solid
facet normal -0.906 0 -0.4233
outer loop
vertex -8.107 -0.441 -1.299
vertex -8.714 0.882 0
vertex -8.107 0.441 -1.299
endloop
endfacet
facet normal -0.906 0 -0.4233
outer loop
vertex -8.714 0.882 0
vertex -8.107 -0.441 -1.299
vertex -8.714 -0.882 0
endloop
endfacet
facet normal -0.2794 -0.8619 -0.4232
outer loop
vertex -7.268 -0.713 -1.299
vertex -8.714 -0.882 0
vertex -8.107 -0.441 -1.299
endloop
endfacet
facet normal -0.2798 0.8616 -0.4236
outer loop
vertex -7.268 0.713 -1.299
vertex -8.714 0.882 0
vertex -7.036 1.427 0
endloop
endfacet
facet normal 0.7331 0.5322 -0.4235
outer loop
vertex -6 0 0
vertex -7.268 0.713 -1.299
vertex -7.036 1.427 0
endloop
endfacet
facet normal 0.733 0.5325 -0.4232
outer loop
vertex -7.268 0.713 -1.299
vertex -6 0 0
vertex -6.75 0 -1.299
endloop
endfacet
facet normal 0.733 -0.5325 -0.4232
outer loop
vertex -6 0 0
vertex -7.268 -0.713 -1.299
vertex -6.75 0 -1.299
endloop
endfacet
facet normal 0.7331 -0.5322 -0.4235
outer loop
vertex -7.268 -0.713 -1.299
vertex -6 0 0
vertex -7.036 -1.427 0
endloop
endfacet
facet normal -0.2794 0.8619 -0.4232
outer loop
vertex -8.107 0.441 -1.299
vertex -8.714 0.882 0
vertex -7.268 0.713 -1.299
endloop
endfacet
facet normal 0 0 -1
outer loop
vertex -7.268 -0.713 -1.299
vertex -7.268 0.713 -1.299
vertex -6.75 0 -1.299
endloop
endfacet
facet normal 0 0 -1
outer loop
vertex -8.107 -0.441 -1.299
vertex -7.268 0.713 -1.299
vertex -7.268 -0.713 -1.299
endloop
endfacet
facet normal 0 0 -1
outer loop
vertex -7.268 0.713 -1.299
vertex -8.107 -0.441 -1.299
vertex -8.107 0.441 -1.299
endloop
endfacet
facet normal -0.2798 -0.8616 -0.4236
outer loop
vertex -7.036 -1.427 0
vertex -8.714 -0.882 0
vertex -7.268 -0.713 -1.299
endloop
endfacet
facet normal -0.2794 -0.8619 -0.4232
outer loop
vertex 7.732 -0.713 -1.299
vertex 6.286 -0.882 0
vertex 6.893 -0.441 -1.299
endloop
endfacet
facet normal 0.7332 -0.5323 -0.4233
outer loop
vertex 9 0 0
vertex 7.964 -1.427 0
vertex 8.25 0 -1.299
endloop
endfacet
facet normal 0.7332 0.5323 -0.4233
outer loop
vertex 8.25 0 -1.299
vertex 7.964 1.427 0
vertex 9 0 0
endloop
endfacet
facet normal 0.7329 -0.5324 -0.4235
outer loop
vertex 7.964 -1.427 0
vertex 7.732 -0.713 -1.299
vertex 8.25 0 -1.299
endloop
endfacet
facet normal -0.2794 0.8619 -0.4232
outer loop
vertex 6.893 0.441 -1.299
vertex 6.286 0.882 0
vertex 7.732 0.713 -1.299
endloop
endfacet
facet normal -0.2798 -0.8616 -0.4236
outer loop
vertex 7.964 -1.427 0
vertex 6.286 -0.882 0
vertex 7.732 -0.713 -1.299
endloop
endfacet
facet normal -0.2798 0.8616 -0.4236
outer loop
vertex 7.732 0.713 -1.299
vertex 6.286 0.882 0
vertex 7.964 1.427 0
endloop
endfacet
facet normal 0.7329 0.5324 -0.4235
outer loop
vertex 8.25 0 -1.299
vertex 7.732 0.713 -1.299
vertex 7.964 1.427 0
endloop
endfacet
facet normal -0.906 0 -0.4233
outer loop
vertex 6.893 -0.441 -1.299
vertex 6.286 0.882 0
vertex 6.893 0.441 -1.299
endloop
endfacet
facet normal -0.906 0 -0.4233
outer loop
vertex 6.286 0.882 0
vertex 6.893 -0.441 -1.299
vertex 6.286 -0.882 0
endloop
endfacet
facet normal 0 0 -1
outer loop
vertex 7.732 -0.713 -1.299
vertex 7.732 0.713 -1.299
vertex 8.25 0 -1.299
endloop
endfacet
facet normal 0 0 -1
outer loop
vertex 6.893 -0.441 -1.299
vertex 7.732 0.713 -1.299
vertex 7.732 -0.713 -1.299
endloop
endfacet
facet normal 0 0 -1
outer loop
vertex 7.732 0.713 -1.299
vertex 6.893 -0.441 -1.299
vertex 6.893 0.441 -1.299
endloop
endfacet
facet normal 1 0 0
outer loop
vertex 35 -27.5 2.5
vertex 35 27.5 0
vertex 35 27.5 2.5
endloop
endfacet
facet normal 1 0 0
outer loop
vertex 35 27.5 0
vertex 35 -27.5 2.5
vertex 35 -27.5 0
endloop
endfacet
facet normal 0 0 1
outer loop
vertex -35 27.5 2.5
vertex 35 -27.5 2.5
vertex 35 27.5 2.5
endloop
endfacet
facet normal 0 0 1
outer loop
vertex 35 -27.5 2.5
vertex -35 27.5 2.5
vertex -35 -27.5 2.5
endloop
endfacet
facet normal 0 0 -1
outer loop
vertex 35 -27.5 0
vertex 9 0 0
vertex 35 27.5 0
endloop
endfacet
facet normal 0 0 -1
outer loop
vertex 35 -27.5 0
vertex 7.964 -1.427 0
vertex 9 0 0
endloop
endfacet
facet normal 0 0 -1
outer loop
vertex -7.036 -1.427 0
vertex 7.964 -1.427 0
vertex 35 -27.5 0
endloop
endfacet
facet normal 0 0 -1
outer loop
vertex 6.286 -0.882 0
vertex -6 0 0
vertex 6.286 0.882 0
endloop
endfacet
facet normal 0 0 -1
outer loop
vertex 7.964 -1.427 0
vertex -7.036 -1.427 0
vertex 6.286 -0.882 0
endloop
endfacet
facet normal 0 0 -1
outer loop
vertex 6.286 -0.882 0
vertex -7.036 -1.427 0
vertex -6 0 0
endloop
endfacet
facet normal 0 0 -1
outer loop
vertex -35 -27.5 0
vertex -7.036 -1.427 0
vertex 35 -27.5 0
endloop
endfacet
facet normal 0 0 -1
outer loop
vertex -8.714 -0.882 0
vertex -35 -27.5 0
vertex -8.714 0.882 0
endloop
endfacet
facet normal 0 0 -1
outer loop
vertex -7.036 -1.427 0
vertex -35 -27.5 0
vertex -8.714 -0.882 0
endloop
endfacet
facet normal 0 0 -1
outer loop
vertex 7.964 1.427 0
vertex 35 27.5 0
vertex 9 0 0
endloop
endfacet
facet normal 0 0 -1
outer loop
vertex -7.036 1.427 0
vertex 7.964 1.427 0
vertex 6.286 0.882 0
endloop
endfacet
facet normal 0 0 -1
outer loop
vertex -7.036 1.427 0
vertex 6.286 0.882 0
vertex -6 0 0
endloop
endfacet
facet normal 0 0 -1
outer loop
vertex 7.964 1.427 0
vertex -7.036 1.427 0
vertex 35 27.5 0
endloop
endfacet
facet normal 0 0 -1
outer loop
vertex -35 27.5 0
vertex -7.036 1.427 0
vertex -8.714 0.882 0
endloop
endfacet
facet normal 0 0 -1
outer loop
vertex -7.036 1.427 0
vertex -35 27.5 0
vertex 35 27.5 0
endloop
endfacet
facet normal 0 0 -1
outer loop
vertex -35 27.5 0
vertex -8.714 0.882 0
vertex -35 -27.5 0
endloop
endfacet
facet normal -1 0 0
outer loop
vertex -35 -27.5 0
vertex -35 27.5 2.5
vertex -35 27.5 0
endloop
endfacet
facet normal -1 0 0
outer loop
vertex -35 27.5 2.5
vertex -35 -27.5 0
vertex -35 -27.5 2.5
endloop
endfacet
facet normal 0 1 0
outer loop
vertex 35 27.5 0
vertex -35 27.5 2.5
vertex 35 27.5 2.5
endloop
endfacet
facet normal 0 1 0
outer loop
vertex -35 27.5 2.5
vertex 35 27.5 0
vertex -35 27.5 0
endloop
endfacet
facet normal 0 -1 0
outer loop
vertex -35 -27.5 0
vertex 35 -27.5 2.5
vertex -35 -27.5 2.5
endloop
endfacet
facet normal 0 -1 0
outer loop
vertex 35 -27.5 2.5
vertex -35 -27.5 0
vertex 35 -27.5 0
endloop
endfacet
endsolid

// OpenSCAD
// file: ../machine.scad
/*
 * Helpers for machinging; i.e. kerf alowances
 *
 * Copyright 2013 <b@Zi.iS>
 * License CC BY 3.0
 */

include <main.scad>;

ZCUT = 0;
XOFF = 0;
YOFF = 0;

module drawing() {
	//create blueprint
	if(preview==0) {
		projection(cut=true) translate([
			XOFF,
			YOFF,
			ZCUT
		]) {
			for(i=[0:$children-1]) child(i);
		}
	} else {
		for(i=[0:$children-1]) child(i);
	}
}

module kerf_cube(
	size
) {
	translate([
		kerf/2*(1-preview),
		kerf/2*(1-preview),
		0
	]) {
		cube([
			size[0] - kerf*(1-preview),
			size[1] - kerf*(1-preview),
			size[2]
		]);
	}
}

module kerf_cylinder(
	r,
	h
) {
	cylinder(
		r = r - kerf/2*(1-preview),
		h = h
	);
}

module part(
	id,
	name
) {
	if(PART<1 || PART==id) {
		echo(str("PART", id, ":", name));
		for(i=[0:$children-1]) child(i);
	}	
}
// file: ../easing.scad
/*
 * Make allowances to ensure good fit.
 *
 * Copyright 2013 <b@Zi.iS>
 * License CC BY 3.0
 */

function ease(value) = min(value*1.1, value + .2);
// file: ../epslion.scad
/*
 * Slightly offset previews to overcome rounding issues
 *
 * Copyright 2013 <b@Zi.iS>
 * License CC BY 3.0
 */

include <config.scad>;

module e(
	shift = -.1,
	size = 1.1
) {
	if(preview == 1) {
		translate([
			0,
			0,
			shift
		]) {
			scale([
				1,
				1,
				size
			]) {
				if($children>0) for (i = [0 : $children-1]) child(i);
			}
		}
	} else {
		if($children>0) for (i = [0 : $children-1]) child(i);
	}
}
// file: ../config.scad
/*
 * Default settings
 *
 * Copyright 2013 <b@Zi.iS>
 * License CC BY 3.0
 */

preview = 1;
$fa = 6;
$fs = 2 - 1.5*(1-preview);
kerf = .2;
PART = 0; //all

// preview colors
color_steel = [.8, .8, .8];
color_wood = [.3, .3, 0];
color_print = [0, .8, 0];
color_plastic = [.7, 1, .7];
// file: ../main.scad
/*
 * A library to make SCAD easier.
 *
 * Copyright 2013 <b@Zi.iS>
 * License CC BY 3.0
 */

include <config.scad>;
use <epslion.scad>;
use <easing.scad>;
use <machine.scad>;
// main file
/*
 * Solarpanel
 *
 * Copyright 2013 b@Zi.iS
 *
 * License CC BY 3.0
 */

include <../main.scad>;

solarpanel();

module solarpanel(
	size = [
		70,
		55,
		2.5
	],
	pitch = 15,
	id
) {
	part(id, str("solarpanel"))

	color([0,0,0]) {
		translate([
			-size[0]/2,
			-size[1]/2,
			0
		]) {
			cube(size);
		}
	}
	color([.75,.75,.75]) {
		for(i=[0:1]) {
			translate([
				-pitch/2 + i*pitch,
				0,
				0,
			]) {
				sphere(
					r = 1.5
				);
			}
		}
	}
}
